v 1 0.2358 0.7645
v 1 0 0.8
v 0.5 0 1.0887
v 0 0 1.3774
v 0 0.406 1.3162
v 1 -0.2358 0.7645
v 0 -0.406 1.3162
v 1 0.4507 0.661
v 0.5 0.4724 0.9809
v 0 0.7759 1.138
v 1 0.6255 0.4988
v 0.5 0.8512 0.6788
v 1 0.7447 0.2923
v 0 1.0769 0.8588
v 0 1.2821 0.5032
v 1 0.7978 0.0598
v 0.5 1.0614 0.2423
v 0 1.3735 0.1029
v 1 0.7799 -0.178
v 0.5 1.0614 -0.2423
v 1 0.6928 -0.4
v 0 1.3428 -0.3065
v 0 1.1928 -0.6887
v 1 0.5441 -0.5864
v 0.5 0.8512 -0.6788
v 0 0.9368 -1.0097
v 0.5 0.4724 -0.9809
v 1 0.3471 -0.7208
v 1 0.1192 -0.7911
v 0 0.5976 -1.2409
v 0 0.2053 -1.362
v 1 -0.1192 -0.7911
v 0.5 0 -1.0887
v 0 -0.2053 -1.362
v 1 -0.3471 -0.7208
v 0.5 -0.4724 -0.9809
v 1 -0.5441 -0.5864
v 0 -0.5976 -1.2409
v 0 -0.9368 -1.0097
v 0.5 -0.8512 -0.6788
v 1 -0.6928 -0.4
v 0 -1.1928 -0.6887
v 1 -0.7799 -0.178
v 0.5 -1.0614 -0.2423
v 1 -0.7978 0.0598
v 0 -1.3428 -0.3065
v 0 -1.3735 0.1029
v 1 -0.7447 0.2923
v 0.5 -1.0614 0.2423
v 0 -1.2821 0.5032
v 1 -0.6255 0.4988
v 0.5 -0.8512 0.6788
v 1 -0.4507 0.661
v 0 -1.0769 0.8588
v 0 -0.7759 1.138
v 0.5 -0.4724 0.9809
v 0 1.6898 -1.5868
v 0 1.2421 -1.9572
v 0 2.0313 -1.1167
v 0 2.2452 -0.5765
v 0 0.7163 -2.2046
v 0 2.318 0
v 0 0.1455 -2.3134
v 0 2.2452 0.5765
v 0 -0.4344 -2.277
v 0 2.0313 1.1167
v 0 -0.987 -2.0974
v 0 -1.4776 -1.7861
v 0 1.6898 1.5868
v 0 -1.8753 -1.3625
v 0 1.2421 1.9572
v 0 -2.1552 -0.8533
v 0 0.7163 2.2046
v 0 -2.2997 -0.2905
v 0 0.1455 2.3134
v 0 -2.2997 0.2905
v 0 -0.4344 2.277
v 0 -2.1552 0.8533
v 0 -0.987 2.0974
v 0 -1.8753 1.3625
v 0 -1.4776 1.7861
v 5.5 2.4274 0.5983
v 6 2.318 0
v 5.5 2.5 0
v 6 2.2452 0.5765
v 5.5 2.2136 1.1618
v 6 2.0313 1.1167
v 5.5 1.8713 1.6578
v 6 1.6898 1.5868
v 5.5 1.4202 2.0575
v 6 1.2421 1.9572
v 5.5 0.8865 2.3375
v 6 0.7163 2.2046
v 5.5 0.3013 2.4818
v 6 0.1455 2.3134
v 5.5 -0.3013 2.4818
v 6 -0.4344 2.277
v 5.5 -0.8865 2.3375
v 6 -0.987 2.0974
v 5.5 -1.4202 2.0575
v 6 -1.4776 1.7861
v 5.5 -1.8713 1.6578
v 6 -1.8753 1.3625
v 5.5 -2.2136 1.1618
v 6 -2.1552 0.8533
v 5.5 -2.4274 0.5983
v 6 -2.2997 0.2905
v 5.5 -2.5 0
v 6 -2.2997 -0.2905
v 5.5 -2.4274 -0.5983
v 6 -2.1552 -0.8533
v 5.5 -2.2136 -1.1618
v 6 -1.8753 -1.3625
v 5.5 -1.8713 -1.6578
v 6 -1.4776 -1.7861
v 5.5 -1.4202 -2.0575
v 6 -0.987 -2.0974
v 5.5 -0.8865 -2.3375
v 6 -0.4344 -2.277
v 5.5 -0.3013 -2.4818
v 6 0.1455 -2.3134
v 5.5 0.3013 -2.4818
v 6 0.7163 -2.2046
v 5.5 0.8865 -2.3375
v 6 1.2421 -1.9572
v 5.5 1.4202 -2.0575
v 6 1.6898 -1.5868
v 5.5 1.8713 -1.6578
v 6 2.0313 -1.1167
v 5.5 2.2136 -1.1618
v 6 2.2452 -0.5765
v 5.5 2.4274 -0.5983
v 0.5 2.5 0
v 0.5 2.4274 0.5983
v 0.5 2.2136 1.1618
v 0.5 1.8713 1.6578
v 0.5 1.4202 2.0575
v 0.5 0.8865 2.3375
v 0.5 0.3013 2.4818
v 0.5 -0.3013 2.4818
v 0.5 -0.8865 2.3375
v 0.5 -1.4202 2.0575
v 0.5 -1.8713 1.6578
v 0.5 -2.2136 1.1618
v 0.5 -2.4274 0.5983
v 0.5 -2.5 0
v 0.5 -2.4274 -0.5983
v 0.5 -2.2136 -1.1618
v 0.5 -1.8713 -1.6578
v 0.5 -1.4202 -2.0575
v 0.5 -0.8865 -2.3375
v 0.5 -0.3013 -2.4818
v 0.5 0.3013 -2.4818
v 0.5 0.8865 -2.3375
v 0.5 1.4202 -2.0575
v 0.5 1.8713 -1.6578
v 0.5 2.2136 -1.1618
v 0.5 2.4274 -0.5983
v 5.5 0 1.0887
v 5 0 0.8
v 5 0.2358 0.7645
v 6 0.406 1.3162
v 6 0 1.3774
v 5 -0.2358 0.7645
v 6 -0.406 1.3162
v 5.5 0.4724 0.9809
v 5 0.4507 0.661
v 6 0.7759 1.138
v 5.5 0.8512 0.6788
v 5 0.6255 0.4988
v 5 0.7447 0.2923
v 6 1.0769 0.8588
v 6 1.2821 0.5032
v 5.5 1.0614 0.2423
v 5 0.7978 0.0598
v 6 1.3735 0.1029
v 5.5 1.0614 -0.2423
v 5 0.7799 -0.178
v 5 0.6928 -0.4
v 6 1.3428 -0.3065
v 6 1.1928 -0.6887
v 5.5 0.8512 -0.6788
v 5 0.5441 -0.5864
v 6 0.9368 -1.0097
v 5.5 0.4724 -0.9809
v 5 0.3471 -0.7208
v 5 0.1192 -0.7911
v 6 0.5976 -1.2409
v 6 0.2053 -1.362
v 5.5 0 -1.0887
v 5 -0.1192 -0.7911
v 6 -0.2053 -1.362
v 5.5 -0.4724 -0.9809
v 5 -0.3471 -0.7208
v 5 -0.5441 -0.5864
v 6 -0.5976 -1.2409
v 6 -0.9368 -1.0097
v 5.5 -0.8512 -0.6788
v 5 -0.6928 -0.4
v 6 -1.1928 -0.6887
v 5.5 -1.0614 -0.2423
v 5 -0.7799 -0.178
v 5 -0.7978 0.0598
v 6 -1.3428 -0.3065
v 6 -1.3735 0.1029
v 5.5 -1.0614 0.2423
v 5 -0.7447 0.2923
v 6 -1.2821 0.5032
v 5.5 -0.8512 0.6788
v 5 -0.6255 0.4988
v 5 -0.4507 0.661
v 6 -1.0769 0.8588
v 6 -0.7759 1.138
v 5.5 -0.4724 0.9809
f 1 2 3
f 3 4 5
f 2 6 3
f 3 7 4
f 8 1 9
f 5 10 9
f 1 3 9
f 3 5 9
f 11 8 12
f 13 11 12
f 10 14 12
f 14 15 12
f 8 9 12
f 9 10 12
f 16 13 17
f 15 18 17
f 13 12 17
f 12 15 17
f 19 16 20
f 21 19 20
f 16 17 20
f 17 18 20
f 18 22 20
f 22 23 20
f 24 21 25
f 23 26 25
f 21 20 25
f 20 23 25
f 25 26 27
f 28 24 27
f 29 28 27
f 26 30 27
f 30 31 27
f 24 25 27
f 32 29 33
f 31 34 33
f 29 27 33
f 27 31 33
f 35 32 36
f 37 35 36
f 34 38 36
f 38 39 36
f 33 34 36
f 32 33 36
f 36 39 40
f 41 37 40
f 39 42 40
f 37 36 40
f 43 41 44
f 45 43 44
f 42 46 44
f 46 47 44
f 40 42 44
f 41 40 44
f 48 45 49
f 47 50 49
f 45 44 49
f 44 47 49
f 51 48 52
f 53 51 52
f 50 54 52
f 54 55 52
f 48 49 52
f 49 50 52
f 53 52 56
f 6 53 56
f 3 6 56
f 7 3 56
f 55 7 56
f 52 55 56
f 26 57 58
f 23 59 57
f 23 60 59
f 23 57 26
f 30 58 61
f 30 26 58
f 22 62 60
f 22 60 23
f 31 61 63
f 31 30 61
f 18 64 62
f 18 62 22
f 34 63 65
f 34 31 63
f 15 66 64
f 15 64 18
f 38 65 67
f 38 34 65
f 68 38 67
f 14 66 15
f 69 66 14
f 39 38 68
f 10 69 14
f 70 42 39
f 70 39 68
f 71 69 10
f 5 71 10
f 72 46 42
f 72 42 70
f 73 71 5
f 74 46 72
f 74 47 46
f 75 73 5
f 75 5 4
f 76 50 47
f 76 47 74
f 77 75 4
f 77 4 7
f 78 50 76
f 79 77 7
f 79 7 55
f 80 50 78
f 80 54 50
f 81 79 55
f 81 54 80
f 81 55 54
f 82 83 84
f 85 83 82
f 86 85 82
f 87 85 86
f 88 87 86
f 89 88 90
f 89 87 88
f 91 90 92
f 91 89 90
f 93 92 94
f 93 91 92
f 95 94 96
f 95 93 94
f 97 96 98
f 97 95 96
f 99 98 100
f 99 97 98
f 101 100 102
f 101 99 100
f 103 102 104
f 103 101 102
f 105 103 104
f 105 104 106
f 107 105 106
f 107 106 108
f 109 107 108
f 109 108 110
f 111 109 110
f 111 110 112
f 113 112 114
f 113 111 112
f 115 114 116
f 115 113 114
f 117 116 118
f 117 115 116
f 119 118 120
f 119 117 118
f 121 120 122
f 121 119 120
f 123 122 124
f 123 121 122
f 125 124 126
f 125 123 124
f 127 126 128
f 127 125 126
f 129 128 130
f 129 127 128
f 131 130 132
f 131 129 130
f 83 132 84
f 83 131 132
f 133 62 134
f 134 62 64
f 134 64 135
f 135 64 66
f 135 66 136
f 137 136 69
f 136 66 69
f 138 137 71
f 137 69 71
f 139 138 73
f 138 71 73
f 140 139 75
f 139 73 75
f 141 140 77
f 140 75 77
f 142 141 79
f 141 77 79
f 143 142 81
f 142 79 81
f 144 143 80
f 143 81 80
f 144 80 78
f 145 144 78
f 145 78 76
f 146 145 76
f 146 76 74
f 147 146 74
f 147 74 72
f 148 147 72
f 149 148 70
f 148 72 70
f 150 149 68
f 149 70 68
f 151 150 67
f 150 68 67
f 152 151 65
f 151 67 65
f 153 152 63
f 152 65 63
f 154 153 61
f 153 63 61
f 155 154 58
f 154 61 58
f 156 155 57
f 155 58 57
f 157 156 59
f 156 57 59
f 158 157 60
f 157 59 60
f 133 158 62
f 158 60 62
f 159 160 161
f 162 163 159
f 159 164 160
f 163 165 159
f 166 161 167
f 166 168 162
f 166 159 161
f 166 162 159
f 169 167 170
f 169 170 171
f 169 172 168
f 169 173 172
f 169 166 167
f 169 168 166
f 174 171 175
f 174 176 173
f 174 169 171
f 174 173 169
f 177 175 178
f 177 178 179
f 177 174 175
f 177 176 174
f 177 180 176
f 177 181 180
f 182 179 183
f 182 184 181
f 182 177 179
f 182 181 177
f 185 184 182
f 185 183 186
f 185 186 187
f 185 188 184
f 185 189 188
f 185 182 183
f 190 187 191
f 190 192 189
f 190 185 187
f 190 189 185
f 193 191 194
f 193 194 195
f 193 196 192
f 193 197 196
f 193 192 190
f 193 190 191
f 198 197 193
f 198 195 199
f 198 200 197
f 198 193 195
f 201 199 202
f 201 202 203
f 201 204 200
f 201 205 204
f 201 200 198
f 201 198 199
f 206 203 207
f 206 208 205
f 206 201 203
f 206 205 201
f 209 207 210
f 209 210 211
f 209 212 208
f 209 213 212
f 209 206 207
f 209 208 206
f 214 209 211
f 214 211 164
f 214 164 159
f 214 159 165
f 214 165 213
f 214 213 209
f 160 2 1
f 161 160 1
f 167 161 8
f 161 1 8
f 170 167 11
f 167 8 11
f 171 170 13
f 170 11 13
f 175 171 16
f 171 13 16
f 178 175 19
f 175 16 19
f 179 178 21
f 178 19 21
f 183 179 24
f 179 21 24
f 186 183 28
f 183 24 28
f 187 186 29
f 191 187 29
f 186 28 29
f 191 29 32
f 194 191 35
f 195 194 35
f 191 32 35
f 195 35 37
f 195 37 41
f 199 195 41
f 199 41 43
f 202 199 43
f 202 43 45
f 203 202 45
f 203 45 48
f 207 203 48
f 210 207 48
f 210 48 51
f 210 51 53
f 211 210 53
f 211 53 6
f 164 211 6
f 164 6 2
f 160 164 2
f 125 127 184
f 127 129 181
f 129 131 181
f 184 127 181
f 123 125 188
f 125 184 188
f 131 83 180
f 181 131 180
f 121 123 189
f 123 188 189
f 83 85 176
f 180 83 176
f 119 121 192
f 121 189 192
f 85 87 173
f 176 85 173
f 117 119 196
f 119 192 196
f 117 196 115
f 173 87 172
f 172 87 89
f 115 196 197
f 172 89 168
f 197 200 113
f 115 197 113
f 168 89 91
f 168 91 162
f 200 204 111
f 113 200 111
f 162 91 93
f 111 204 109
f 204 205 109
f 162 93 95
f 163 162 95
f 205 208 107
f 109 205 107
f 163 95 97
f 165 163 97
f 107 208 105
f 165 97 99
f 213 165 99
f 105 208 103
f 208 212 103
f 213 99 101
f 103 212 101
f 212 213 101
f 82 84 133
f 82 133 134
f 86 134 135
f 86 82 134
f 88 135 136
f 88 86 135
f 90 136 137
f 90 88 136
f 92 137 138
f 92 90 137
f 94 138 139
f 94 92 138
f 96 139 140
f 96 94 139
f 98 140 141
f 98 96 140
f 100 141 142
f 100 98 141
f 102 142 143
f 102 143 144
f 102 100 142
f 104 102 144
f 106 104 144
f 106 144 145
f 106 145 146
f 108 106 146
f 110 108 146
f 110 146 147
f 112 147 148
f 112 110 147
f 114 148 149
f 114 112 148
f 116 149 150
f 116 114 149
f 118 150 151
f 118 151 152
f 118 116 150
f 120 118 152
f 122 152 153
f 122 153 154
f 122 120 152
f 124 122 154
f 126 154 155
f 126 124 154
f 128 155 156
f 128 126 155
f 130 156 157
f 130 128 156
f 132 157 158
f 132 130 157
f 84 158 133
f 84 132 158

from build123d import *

# Parameters (mm, degrees)
SKIZZE1_W            = 6
SKIZZE1_H            = 2
M2_GEWINDEBOHRUNG1_D = 1.6
FASE1_SIZE           = 0.5
FASE1_SIZE2          = 0.181985117
FASE2_SIZE           = 1
FASE2_SIZE2          = 0.577350269


with BuildPart() as part:
    # Skizze1 → Rotation1 (revolve)
    with BuildSketch(Plane.XY):
        with Locations((3, 1.5)):
            Rectangle(SKIZZE1_W, SKIZZE1_H)
    revolve(axis=Axis((0, 0, 0), (1, 0, 0)))

    # M2 Gewindebohrung1 (through all)
    with Locations(Plane(origin=(6, 0, 0), x_dir=(0, 0, -1), z_dir=(1, 0, 0))):
        with Locations((0, 0)):
            Hole(M2_GEWINDEBOHRUNG1_D / 2)

    # Fase1
    fase1_edges = [part.edges().sort_by_distance(p)[0] for p in [
        (6, -2.5, 0),
        (0, -2.5, 0),
    ]]
    fase1_side = [part.faces().sort_by_distance(p)[0] for p in [
        (3, -2.5, 0),
    ]]
    chamfer(fase1_edges, length=FASE1_SIZE, length2=FASE1_SIZE2, reference=fase1_side[0])

    # Fase2
    fase2_edges = [part.edges().sort_by_distance(p)[0] for p in [
        (6, 0, -0.8),
        (0, 0, -0.8),
    ]]
    fase2_side = [part.faces().sort_by_distance(p)[0] for p in [
        (3, 0, -0.8),
    ]]
    chamfer(fase2_edges, length=FASE2_SIZE, length2=FASE2_SIZE2, reference=fase2_side[0])


solid = part.part
